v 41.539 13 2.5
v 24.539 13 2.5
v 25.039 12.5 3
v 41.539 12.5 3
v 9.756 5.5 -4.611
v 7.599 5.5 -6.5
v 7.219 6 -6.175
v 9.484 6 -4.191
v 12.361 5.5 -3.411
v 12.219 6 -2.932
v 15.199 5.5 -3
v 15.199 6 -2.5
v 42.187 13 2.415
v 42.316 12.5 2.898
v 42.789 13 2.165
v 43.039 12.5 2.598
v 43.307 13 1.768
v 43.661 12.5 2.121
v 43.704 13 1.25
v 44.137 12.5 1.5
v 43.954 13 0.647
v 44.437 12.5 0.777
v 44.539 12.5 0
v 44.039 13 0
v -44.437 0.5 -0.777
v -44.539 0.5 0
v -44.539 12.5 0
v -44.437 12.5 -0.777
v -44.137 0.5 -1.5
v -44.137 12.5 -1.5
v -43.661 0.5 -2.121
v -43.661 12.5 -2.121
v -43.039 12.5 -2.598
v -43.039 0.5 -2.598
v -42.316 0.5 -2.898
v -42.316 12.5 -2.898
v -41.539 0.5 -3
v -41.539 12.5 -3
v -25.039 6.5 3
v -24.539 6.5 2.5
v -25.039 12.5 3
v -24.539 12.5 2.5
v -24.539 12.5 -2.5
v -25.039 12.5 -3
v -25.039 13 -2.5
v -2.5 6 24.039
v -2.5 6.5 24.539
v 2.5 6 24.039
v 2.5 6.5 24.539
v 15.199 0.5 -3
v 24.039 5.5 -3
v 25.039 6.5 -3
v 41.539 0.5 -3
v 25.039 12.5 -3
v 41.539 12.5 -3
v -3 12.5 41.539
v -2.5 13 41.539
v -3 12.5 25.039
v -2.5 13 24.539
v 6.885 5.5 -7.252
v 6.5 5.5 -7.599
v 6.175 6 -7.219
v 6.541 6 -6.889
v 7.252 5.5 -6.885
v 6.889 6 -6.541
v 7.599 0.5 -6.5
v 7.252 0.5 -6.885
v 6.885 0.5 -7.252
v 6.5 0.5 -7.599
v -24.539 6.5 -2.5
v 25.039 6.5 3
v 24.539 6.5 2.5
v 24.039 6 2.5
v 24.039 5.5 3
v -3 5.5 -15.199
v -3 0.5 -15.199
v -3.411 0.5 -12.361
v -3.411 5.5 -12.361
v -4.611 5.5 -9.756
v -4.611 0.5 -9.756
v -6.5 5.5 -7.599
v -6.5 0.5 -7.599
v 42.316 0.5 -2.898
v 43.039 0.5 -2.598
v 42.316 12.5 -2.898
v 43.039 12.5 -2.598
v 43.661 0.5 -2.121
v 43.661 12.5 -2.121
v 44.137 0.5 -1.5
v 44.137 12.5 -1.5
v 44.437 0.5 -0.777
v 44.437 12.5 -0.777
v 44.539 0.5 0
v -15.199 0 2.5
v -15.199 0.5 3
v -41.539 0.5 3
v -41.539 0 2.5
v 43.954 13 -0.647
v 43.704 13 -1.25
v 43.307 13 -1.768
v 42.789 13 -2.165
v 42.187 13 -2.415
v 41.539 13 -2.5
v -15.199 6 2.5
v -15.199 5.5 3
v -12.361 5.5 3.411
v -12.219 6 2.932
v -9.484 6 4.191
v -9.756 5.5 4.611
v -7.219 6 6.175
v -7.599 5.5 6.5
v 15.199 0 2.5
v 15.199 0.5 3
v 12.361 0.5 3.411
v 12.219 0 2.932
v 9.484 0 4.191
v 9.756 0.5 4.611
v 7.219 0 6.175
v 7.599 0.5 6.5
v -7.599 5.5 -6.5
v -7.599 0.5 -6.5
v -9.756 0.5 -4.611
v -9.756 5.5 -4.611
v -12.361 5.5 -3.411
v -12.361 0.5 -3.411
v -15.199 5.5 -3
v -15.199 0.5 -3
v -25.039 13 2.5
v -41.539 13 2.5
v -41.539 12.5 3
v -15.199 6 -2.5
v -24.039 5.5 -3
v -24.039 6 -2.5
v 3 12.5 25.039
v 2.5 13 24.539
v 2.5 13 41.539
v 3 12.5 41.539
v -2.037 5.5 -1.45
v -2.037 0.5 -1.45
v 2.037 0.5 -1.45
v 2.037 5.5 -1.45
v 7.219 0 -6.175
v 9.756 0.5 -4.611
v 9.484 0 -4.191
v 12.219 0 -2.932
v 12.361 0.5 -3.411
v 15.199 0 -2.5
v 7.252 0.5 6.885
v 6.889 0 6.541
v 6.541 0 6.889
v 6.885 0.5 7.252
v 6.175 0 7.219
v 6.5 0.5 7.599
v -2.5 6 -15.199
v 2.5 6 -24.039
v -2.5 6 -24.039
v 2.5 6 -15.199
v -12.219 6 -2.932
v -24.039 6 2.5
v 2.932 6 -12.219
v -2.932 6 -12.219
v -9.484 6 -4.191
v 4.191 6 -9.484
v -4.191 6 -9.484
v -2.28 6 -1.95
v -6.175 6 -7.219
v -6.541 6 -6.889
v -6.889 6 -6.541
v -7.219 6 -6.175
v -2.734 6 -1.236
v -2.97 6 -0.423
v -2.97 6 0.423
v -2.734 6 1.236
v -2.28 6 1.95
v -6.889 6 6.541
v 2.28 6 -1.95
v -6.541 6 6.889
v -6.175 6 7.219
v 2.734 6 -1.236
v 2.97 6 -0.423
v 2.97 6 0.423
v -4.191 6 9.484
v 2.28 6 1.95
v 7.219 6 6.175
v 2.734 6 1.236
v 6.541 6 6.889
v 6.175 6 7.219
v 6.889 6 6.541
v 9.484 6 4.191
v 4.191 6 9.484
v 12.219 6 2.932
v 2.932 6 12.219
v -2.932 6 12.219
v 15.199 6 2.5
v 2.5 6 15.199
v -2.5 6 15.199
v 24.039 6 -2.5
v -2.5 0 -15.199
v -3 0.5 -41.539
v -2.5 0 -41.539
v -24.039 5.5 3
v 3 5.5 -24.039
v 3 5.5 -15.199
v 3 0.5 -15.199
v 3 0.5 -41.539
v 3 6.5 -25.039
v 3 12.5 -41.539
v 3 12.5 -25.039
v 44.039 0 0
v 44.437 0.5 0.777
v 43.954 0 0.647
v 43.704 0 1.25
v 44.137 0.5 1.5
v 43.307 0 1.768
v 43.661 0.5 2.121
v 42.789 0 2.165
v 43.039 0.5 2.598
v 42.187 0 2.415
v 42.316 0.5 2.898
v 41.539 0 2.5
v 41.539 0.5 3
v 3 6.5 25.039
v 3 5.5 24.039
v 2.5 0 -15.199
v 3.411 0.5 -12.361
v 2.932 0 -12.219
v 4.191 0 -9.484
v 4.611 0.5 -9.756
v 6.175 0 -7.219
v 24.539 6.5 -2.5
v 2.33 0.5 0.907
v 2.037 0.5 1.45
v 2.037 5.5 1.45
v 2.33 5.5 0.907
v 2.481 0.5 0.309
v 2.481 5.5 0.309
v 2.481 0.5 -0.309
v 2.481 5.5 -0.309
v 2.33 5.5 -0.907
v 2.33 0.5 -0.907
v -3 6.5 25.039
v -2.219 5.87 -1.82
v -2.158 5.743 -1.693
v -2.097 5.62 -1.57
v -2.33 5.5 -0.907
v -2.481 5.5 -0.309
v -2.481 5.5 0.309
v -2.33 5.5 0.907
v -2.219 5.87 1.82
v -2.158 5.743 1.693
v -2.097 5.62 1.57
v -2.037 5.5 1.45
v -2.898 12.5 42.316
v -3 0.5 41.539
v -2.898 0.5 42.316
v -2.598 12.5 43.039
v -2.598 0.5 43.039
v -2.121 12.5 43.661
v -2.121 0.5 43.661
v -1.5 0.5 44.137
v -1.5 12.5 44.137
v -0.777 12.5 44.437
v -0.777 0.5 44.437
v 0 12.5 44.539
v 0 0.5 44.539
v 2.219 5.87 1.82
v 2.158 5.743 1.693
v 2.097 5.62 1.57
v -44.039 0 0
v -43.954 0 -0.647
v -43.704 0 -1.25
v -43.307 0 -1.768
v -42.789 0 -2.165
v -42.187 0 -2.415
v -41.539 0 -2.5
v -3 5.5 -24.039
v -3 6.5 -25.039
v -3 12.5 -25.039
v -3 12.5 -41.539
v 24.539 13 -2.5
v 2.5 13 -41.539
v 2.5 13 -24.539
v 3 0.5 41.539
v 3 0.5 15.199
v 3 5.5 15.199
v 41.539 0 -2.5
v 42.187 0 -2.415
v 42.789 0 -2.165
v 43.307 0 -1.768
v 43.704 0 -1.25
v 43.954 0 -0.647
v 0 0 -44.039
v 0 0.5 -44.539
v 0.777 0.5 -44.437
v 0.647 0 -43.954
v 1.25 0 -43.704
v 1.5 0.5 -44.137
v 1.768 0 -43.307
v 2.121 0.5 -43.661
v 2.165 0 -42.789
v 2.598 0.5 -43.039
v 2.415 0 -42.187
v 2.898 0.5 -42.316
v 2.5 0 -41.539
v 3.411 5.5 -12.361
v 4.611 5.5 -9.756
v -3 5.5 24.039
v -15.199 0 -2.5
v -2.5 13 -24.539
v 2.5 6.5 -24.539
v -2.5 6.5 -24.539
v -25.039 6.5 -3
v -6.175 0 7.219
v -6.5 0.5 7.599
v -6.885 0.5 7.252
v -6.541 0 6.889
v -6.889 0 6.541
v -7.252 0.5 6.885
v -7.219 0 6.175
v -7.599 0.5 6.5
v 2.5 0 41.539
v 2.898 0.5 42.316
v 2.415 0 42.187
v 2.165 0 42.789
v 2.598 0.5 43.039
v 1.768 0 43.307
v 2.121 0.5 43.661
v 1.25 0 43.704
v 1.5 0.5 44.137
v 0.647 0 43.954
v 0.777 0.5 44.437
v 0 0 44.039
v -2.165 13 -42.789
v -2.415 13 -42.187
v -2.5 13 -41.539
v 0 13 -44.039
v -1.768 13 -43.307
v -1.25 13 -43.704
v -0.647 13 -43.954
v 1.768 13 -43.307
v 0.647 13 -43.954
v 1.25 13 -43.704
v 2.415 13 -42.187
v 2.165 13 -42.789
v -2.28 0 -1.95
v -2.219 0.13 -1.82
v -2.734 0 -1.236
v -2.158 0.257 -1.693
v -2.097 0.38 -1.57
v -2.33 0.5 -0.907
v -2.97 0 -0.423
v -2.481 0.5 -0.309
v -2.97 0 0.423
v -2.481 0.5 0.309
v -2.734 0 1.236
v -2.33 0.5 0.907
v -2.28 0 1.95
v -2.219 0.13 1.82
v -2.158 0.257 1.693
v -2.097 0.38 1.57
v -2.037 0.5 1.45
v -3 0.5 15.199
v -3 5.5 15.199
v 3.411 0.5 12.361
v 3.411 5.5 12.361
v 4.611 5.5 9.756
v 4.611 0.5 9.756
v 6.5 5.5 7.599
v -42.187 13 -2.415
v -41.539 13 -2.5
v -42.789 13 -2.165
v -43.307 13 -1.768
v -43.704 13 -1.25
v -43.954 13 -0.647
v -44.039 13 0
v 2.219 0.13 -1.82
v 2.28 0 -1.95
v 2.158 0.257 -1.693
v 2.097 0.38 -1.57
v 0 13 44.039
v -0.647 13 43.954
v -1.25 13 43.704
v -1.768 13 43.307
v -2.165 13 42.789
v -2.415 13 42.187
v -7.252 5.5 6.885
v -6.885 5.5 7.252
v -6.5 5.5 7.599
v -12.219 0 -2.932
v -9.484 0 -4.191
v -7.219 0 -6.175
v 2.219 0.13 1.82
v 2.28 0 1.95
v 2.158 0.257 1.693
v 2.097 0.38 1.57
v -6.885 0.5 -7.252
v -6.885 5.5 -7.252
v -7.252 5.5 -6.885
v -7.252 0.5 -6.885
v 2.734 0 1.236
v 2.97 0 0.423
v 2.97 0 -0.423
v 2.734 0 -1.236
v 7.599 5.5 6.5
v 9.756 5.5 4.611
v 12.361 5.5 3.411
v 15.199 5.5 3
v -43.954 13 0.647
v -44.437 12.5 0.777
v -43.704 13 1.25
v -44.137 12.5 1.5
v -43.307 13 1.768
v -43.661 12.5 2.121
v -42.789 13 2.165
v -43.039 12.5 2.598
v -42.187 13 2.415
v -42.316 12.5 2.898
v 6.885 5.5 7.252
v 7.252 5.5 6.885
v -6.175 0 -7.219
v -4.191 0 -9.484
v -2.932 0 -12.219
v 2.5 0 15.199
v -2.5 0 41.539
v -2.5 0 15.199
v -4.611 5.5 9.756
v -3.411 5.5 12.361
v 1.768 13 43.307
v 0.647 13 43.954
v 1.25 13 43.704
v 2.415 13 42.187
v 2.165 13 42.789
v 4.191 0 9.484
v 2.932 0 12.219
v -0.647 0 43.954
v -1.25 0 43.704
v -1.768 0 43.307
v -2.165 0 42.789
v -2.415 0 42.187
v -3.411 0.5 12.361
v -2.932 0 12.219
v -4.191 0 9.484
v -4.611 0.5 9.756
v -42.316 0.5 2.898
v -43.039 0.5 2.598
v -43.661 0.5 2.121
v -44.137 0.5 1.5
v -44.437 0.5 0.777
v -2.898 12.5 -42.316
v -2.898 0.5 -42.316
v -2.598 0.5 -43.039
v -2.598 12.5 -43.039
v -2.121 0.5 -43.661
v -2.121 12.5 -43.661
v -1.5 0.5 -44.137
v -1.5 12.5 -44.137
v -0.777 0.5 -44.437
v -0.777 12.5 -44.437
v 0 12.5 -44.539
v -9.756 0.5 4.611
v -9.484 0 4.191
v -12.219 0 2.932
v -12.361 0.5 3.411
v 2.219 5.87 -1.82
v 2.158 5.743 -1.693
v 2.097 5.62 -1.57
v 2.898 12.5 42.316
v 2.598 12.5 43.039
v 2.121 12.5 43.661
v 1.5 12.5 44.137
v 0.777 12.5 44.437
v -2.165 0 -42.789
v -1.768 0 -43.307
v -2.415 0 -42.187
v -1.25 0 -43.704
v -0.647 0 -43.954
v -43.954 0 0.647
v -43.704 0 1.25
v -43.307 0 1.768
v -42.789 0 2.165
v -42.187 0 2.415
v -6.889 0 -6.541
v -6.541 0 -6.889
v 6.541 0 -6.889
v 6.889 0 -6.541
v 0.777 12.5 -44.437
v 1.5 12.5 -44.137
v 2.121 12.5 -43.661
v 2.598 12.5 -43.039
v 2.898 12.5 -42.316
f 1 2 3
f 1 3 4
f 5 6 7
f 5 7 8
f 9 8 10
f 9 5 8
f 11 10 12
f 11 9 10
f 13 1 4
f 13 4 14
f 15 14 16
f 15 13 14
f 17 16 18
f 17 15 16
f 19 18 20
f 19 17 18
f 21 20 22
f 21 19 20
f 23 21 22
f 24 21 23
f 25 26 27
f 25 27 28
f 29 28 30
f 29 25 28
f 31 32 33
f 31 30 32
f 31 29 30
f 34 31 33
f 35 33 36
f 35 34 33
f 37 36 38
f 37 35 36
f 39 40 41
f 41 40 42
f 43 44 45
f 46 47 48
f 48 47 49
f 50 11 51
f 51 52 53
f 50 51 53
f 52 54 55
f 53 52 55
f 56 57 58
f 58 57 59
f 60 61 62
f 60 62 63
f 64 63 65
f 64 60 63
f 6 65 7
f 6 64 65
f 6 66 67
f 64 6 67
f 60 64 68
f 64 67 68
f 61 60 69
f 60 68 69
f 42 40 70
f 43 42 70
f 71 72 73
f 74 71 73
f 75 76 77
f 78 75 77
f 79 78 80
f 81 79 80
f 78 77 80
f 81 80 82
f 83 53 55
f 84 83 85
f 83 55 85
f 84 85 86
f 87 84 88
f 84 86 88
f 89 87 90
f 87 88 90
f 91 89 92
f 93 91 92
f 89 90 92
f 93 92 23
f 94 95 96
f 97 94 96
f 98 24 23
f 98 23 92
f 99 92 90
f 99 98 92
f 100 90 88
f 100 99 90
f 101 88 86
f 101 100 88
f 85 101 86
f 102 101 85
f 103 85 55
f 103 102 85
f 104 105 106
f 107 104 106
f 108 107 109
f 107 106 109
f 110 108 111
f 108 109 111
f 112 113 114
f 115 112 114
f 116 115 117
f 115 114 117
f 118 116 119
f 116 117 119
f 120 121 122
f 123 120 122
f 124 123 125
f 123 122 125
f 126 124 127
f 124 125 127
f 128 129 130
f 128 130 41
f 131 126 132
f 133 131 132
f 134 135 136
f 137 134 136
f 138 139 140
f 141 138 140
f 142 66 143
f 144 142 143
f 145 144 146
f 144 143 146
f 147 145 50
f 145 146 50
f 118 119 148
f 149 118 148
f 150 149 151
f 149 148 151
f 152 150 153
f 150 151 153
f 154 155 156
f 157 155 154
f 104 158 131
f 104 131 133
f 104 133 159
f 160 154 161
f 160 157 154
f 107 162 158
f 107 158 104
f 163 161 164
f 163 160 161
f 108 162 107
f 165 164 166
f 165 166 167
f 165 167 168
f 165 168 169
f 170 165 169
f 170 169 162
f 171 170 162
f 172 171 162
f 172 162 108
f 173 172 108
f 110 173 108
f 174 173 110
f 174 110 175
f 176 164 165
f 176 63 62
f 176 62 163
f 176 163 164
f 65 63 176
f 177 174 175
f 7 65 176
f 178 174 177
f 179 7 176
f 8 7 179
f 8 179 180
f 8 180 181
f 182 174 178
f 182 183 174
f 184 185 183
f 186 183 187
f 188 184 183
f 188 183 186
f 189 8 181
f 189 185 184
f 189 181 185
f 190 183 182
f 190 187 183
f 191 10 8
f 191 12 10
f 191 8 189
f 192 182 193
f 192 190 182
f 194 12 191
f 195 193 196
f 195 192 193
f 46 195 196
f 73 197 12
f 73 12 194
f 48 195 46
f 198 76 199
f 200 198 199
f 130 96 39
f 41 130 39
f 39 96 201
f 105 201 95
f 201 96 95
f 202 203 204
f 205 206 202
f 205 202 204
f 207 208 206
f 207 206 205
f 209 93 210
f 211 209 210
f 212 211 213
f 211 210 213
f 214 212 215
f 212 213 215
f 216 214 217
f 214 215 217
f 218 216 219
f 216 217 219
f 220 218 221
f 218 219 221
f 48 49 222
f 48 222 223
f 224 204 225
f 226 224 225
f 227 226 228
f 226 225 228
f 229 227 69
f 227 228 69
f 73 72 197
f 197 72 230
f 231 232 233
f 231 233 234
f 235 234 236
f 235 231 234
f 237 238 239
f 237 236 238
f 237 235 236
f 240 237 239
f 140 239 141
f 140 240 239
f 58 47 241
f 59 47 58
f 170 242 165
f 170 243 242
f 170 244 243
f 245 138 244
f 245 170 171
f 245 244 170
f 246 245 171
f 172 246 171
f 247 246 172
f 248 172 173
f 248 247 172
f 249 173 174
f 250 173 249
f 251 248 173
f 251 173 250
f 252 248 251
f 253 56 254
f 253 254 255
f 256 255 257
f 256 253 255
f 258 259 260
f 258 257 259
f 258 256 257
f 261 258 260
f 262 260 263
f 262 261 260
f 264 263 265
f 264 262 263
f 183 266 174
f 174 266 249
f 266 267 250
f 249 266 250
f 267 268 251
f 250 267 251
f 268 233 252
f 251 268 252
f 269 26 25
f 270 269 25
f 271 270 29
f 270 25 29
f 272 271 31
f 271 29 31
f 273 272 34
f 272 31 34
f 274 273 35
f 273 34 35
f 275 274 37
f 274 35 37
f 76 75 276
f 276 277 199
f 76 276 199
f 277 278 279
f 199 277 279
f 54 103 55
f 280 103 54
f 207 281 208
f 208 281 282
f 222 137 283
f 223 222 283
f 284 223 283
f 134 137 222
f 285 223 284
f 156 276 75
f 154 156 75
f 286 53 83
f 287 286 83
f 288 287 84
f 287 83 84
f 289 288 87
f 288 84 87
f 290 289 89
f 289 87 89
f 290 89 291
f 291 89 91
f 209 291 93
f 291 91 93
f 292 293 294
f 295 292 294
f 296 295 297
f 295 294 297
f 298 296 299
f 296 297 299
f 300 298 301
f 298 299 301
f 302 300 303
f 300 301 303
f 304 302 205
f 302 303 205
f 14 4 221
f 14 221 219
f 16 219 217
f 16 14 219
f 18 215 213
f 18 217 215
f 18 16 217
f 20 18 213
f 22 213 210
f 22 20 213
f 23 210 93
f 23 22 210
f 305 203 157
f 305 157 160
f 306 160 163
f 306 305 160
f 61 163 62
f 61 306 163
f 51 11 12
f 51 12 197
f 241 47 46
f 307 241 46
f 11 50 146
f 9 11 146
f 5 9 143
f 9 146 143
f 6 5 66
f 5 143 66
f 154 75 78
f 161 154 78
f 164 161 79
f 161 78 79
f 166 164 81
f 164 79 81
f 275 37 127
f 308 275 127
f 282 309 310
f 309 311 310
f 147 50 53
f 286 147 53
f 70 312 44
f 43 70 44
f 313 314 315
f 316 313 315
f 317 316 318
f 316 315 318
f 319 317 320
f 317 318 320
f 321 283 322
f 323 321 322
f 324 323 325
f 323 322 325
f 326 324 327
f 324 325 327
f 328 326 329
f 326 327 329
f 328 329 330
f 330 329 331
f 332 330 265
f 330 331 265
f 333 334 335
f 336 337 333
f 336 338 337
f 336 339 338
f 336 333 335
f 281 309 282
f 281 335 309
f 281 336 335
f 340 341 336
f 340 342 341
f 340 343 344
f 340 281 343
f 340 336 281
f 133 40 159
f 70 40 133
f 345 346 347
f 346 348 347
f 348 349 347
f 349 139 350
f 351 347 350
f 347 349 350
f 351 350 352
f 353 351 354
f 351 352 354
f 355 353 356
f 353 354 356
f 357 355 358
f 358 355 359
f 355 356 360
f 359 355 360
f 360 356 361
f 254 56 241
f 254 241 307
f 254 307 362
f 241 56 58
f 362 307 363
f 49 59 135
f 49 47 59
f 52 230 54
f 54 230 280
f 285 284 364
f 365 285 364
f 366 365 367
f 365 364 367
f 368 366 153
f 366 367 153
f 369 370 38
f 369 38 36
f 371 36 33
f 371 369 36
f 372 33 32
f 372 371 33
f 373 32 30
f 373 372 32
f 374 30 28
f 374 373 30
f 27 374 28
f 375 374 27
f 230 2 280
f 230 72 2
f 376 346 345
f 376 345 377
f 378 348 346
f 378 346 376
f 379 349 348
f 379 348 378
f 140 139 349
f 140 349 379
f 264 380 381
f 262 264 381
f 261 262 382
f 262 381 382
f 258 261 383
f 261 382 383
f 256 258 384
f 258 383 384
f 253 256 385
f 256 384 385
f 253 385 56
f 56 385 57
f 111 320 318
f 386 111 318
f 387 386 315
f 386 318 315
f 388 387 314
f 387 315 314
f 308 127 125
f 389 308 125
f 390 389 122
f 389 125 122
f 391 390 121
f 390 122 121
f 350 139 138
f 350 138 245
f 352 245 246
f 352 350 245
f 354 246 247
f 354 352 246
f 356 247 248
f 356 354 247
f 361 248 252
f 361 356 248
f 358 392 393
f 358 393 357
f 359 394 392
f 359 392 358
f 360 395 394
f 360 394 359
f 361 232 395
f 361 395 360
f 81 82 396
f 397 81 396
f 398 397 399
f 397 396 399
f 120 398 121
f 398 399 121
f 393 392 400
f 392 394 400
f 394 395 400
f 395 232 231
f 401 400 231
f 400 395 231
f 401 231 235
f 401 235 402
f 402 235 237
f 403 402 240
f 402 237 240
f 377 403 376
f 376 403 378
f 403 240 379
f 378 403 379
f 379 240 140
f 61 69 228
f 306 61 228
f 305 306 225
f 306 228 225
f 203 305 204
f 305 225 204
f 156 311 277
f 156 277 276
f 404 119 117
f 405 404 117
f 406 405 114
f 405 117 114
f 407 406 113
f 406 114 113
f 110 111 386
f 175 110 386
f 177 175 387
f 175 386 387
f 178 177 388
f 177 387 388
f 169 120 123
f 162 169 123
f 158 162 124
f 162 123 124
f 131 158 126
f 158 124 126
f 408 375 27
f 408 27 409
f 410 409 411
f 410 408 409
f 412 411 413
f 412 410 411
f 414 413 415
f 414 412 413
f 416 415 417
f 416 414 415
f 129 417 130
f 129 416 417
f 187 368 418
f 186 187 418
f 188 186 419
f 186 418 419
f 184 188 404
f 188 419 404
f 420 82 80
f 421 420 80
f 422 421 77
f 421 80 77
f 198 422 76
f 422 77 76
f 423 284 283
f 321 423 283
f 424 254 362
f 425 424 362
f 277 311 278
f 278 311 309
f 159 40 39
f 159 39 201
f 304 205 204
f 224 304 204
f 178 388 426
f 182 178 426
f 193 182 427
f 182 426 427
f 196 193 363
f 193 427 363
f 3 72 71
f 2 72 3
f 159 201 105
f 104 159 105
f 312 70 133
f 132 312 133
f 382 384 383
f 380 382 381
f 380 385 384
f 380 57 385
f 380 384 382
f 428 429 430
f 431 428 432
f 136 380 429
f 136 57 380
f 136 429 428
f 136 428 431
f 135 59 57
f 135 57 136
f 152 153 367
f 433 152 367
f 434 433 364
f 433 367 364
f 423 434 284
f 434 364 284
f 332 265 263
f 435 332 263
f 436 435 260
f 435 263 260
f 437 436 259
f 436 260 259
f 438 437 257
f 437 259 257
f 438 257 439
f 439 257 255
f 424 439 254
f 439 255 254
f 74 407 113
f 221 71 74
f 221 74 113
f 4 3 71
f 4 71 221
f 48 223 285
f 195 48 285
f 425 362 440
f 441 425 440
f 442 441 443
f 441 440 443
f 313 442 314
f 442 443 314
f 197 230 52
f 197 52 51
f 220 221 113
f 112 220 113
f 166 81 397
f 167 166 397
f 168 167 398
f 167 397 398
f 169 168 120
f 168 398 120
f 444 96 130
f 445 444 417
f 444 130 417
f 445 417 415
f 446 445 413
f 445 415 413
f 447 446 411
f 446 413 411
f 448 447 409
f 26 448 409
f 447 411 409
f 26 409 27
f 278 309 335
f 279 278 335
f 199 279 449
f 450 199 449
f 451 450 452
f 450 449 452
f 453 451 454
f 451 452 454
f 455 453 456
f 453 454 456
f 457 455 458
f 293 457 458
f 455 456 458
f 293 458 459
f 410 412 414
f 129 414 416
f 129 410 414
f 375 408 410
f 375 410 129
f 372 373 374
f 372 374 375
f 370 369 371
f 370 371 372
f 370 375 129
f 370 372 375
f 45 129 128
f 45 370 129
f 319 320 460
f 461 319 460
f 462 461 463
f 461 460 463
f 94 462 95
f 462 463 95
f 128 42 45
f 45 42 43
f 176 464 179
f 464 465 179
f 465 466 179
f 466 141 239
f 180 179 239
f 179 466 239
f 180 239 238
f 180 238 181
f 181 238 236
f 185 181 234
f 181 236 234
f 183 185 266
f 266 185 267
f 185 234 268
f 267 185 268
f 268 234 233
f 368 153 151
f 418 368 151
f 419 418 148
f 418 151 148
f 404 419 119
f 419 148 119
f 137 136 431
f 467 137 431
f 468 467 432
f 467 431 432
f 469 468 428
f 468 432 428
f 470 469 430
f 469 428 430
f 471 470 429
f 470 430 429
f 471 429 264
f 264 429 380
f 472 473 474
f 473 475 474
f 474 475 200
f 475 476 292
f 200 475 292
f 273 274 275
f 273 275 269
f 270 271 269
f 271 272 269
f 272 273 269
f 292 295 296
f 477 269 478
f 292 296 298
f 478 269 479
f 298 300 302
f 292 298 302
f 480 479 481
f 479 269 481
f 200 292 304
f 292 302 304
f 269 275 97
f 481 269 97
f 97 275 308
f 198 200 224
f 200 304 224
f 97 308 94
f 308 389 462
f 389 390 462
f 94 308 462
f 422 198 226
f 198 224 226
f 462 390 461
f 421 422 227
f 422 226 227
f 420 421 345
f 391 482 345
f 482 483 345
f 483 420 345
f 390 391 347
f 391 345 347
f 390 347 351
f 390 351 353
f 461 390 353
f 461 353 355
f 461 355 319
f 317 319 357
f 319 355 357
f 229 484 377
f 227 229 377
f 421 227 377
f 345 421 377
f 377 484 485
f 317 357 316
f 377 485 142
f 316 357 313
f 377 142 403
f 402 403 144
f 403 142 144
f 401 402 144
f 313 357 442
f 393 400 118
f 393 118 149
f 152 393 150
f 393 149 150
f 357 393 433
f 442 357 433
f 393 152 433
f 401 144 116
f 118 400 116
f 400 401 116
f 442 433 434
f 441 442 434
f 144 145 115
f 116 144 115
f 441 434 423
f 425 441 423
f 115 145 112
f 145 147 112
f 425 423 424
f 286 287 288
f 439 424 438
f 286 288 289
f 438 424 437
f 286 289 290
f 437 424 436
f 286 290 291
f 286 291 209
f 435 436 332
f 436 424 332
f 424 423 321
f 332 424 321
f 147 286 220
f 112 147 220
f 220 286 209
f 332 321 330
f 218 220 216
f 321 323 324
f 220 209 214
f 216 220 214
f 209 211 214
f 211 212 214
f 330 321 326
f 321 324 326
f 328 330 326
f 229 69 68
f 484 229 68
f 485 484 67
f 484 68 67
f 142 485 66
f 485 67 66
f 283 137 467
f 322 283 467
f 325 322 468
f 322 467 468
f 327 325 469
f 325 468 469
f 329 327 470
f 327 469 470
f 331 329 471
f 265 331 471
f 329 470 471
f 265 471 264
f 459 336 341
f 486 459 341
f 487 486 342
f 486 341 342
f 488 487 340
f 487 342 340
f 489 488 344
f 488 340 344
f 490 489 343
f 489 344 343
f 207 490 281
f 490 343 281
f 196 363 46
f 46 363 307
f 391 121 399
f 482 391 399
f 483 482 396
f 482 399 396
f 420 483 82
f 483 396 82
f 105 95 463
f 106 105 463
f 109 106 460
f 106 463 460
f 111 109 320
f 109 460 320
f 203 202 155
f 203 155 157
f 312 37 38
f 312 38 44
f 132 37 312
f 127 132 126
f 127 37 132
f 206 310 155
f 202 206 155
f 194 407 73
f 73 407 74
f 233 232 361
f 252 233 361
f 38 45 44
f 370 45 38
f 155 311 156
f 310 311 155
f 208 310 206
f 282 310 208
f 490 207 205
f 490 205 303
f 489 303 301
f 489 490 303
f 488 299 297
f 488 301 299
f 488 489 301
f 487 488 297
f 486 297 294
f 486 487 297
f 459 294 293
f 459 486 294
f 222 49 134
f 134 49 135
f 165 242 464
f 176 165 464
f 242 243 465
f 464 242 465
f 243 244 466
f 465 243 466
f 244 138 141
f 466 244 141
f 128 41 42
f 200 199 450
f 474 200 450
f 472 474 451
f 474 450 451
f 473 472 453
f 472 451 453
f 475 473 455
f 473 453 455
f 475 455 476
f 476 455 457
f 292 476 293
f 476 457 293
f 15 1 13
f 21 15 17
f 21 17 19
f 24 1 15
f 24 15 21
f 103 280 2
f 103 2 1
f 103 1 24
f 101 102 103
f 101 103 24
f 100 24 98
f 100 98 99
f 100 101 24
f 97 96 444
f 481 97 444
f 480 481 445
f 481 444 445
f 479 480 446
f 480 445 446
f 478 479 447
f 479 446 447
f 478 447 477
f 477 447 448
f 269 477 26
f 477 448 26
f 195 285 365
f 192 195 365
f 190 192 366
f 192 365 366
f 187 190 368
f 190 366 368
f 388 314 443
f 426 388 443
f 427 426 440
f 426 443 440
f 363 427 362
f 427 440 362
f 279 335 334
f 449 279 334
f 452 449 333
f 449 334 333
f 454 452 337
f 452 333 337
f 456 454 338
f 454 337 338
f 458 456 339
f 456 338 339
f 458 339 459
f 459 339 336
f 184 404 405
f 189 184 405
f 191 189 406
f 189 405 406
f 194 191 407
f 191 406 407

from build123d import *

# Parameters (mm, degrees)
SKETCH1_R           = 10
SKETCH1_R_2         = 2.5
BOSS_EXTRUDE1_DEPTH = 6
SKETCH2_W           = 35
SKETCH2_H           = 6
SKETCH2_W_2         = 6
SKETCH2_H_2         = 35
BOSS_EXTRUDE2_DEPTH = 6
SKETCH3_W           = 20
SKETCH3_H           = 6
SKETCH3_W_2         = 6
SKETCH3_H_2         = 20
BOSS_EXTRUDE3_DEPTH = 7
FILLET1_R           = 10
FILLET2_R           = 3
CHAMFER1_SIZE       = 0.5


with BuildPart() as part:
    # Sketch1 → Boss-Extrude1 (new body)
    # profile 1 of 3: a face of its own
    with BuildSketch(Plane(origin=(0, 0, 0), x_dir=(1, 0, 0), z_dir=(0, 1, 0))):
        with Locations(Location((0, 0, 0), (0, 0, 270))):
            Circle(SKETCH1_R)
        Circle(SKETCH1_R_2, mode=Mode.SUBTRACT)
    # profile 2 of 3: a face of its own
    with BuildSketch(Plane(origin=(0, 0, 0), x_dir=(1, 0, 0), z_dir=(0, 1, 0))):
        with BuildLine():
            ThreePointArc((2.036541185, 1.45), (0, 2.5), (-2.036541185, 1.45))
            Line((-2.036541185, 1.45), (2.036541185, 1.45))
        make_face()
    # profile 3 of 3: a face of its own
    with BuildSketch(Plane(origin=(0, 0, 0), x_dir=(1, 0, 0), z_dir=(0, 1, 0))):
        with BuildLine():
            Line((2.036541185, -1.45), (-2.036541185, -1.45))
            ThreePointArc((-2.036541185, -1.45), (0, -2.5), (2.036541185, -1.45))
        make_face()
    extrude(amount=BOSS_EXTRUDE1_DEPTH)

    # Sketch2 → Boss-Extrude2 (add)
    with BuildSketch(Plane(origin=(0, 6, 0), x_dir=(1, 0, 0), z_dir=(0, 1, 0))):
        with Locations((27.039392014, 0)):
            Rectangle(SKETCH2_W, SKETCH2_H)
        with Locations((0, 27.039392014)):
            Rectangle(SKETCH2_W_2, SKETCH2_H_2)
        with Locations((0, -27.039392014)):
            Rectangle(SKETCH2_W_2, SKETCH2_H_2)
        with Locations((-27.039392014, 0)):
            Rectangle(SKETCH2_W, SKETCH2_H)
    extrude(amount=-BOSS_EXTRUDE2_DEPTH)

    # Sketch3 → Boss-Extrude3 (add)
    with BuildSketch(Plane(origin=(0, 6, 0), x_dir=(1, 0, 0), z_dir=(0, 1, 0))):
        with Locations((-34.539392014, 0)):
            Rectangle(SKETCH3_W, SKETCH3_H)
        with Locations((0, 34.539392014)):
            Rectangle(SKETCH3_W_2, SKETCH3_H_2)
        with Locations((34.539392014, 0)):
            Rectangle(SKETCH3_W, SKETCH3_H)
        with Locations((0, -34.539392014)):
            Rectangle(SKETCH3_W_2, SKETCH3_H_2)
    extrude(amount=BOSS_EXTRUDE3_DEPTH)

    # Fillet1
    fillet1_edges = [part.edges().sort_by_distance(p)[0] for p in [
        (-3, 3, -9.539392014),
        (3, 3, -9.539392014),
        (9.539392014, 3, -3),
        (9.539392014, 3, 3),
        (3, 3, 9.539392014),
        (-3, 3, 9.539392014),
        (-9.539392014, 3, 3),
        (-9.539392014, 3, -3),
    ]]
    fillet(fillet1_edges, radius=FILLET1_R)

    # Fillet2
    fillet2_edges = [part.edges().sort_by_distance(p)[0] for p in [
        (44.539392014, 6.5, -3),
        (44.539392014, 6.5, 3),
        (3, 6.5, 44.539392014),
        (-3, 6.5, 44.539392014),
        (-44.539392014, 6.5, 3),
        (-44.539392014, 6.5, -3),
        (3, 6.5, -44.539392014),
        (-3, 6.5, -44.539392014),
    ]]
    fillet(fillet2_edges, radius=FILLET2_R - 0.0001)  # a hair under: the kernel refuses the full size

    # Chamfer1
    chamfer1_edges = [part.edges().sort_by_distance(p)[0] for p in [
        (19.869038084, 6, -3),
        (24.539392014, 6, 0),
        (24.539392014, 9.5, -3),
        (24.539392014, 9.5, 3),
        (33.039442014, 13, 3),
        (0, 6, 1.45),
        (3, 6, 19.869038084),
        (0, 6, 24.539392014),
        (3, 9.5, 24.539392014),
        (-3, 9.5, 24.539392014),
        (-3, 13, 33.039442014),
        (28.369088084, 0, -3),
        (7.071067812, 6, -7.071067812),
        (7.071067812, 0, -7.071067812),
        (3, 6, -19.869038084),
        (-3, 0, -28.369088084),
        (-7.071067812, 0, -7.071067812),
        (-7.071067812, 6, -7.071067812),
        (-19.869038084, 6, -3),
        (-28.369088084, 0, 3),
        (-7.071067812, 6, 7.071067812),
        (-7.071067812, 0, 7.071067812),
        (-3, 6, 19.869038084),
        (3, 0, 28.369088084),
        (7.071067812, 6, 7.071067812),
        (7.071067812, 0, 7.071067812),
        (19.869038084, 6, 3),
        (11.015384021, 6, -3.917048938),
        (11.015384021, 0, -3.917048938),
        (3.917048938, 6, -11.015384021),
        (3.917048938, 0, -11.015384021),
        (-3.917048938, 6, -11.015384021),
        (-3.917048938, 0, -11.015384021),
        (-2.5, 6, 0),
        (-11.015384021, 6, -3.917048938),
        (-11.015384021, 0, -3.917048938),
        (-11.015384021, 6, 3.917048938),
        (-11.015384021, 0, 3.917048938),
        (-3.917048938, 6, 11.015384021),
        (-3.917048938, 0, 11.015384021),
        (3.917048938, 6, 11.015384021),
        (3.917048938, 0, 11.015384021),
        (11.015384021, 6, 3.917048938),
        (11.015384021, 0, 3.917048938),
        (0, 6, -1.45),
        (33.039442014, 13, -3),
        (43.660741647, 13, 2.121349633),
        (43.660741647, 13, -2.121349633),
        (-28.369088084, 0, -3),
        (3, 0, -28.369088084),
        (28.369088084, 0, 3),
        (-3, 0, 28.369088084),
        (-2.121349633, 0, -43.660741647),
        (2.121349633, 0, -43.660741647),
        (-43.660741647, 0, -2.121349633),
        (-43.660741647, 0, 2.121349633),
        (-2.121349633, 0, 43.660741647),
        (2.121349633, 0, 43.660741647),
        (43.660741647, 0, 2.121349633),
        (43.660741647, 0, -2.121349633),
        (3, 13, 33.039442014),
        (-2.121349633, 13, 43.660741647),
        (2.121349633, 13, 43.660741647),
        (-33.039442014, 13, 3),
        (-43.660741647, 13, -2.121349633),
        (-43.660741647, 13, 2.121349633),
        (-3, 13, -33.039442014),
        (-2.121349633, 13, -43.660741647),
        (2.121349633, 13, -43.660741647),
        (2.5, 6, 0),
        (0, 0, -1.45),
        (-2.5, 0, 0),
        (0, 0, 1.45),
        (-19.869038084, 6, 3),
        (-24.539392014, 6, 0),
        (-24.539392014, 9.5, 3),
        (-24.539392014, 9.5, -3),
        (2.5, 0, 0),
        (-24.539392014, 13, 0),
        (-33.039442014, 13, -3),
        (-3, 6, -19.869038084),
        (0, 6, -24.539392014),
        (-3, 9.5, -24.539392014),
        (3, 9.5, -24.539392014),
        (3, 13, -33.039442014),
    ]]
    chamfer(chamfer1_edges, length=CHAMFER1_SIZE)


solid = part.part
